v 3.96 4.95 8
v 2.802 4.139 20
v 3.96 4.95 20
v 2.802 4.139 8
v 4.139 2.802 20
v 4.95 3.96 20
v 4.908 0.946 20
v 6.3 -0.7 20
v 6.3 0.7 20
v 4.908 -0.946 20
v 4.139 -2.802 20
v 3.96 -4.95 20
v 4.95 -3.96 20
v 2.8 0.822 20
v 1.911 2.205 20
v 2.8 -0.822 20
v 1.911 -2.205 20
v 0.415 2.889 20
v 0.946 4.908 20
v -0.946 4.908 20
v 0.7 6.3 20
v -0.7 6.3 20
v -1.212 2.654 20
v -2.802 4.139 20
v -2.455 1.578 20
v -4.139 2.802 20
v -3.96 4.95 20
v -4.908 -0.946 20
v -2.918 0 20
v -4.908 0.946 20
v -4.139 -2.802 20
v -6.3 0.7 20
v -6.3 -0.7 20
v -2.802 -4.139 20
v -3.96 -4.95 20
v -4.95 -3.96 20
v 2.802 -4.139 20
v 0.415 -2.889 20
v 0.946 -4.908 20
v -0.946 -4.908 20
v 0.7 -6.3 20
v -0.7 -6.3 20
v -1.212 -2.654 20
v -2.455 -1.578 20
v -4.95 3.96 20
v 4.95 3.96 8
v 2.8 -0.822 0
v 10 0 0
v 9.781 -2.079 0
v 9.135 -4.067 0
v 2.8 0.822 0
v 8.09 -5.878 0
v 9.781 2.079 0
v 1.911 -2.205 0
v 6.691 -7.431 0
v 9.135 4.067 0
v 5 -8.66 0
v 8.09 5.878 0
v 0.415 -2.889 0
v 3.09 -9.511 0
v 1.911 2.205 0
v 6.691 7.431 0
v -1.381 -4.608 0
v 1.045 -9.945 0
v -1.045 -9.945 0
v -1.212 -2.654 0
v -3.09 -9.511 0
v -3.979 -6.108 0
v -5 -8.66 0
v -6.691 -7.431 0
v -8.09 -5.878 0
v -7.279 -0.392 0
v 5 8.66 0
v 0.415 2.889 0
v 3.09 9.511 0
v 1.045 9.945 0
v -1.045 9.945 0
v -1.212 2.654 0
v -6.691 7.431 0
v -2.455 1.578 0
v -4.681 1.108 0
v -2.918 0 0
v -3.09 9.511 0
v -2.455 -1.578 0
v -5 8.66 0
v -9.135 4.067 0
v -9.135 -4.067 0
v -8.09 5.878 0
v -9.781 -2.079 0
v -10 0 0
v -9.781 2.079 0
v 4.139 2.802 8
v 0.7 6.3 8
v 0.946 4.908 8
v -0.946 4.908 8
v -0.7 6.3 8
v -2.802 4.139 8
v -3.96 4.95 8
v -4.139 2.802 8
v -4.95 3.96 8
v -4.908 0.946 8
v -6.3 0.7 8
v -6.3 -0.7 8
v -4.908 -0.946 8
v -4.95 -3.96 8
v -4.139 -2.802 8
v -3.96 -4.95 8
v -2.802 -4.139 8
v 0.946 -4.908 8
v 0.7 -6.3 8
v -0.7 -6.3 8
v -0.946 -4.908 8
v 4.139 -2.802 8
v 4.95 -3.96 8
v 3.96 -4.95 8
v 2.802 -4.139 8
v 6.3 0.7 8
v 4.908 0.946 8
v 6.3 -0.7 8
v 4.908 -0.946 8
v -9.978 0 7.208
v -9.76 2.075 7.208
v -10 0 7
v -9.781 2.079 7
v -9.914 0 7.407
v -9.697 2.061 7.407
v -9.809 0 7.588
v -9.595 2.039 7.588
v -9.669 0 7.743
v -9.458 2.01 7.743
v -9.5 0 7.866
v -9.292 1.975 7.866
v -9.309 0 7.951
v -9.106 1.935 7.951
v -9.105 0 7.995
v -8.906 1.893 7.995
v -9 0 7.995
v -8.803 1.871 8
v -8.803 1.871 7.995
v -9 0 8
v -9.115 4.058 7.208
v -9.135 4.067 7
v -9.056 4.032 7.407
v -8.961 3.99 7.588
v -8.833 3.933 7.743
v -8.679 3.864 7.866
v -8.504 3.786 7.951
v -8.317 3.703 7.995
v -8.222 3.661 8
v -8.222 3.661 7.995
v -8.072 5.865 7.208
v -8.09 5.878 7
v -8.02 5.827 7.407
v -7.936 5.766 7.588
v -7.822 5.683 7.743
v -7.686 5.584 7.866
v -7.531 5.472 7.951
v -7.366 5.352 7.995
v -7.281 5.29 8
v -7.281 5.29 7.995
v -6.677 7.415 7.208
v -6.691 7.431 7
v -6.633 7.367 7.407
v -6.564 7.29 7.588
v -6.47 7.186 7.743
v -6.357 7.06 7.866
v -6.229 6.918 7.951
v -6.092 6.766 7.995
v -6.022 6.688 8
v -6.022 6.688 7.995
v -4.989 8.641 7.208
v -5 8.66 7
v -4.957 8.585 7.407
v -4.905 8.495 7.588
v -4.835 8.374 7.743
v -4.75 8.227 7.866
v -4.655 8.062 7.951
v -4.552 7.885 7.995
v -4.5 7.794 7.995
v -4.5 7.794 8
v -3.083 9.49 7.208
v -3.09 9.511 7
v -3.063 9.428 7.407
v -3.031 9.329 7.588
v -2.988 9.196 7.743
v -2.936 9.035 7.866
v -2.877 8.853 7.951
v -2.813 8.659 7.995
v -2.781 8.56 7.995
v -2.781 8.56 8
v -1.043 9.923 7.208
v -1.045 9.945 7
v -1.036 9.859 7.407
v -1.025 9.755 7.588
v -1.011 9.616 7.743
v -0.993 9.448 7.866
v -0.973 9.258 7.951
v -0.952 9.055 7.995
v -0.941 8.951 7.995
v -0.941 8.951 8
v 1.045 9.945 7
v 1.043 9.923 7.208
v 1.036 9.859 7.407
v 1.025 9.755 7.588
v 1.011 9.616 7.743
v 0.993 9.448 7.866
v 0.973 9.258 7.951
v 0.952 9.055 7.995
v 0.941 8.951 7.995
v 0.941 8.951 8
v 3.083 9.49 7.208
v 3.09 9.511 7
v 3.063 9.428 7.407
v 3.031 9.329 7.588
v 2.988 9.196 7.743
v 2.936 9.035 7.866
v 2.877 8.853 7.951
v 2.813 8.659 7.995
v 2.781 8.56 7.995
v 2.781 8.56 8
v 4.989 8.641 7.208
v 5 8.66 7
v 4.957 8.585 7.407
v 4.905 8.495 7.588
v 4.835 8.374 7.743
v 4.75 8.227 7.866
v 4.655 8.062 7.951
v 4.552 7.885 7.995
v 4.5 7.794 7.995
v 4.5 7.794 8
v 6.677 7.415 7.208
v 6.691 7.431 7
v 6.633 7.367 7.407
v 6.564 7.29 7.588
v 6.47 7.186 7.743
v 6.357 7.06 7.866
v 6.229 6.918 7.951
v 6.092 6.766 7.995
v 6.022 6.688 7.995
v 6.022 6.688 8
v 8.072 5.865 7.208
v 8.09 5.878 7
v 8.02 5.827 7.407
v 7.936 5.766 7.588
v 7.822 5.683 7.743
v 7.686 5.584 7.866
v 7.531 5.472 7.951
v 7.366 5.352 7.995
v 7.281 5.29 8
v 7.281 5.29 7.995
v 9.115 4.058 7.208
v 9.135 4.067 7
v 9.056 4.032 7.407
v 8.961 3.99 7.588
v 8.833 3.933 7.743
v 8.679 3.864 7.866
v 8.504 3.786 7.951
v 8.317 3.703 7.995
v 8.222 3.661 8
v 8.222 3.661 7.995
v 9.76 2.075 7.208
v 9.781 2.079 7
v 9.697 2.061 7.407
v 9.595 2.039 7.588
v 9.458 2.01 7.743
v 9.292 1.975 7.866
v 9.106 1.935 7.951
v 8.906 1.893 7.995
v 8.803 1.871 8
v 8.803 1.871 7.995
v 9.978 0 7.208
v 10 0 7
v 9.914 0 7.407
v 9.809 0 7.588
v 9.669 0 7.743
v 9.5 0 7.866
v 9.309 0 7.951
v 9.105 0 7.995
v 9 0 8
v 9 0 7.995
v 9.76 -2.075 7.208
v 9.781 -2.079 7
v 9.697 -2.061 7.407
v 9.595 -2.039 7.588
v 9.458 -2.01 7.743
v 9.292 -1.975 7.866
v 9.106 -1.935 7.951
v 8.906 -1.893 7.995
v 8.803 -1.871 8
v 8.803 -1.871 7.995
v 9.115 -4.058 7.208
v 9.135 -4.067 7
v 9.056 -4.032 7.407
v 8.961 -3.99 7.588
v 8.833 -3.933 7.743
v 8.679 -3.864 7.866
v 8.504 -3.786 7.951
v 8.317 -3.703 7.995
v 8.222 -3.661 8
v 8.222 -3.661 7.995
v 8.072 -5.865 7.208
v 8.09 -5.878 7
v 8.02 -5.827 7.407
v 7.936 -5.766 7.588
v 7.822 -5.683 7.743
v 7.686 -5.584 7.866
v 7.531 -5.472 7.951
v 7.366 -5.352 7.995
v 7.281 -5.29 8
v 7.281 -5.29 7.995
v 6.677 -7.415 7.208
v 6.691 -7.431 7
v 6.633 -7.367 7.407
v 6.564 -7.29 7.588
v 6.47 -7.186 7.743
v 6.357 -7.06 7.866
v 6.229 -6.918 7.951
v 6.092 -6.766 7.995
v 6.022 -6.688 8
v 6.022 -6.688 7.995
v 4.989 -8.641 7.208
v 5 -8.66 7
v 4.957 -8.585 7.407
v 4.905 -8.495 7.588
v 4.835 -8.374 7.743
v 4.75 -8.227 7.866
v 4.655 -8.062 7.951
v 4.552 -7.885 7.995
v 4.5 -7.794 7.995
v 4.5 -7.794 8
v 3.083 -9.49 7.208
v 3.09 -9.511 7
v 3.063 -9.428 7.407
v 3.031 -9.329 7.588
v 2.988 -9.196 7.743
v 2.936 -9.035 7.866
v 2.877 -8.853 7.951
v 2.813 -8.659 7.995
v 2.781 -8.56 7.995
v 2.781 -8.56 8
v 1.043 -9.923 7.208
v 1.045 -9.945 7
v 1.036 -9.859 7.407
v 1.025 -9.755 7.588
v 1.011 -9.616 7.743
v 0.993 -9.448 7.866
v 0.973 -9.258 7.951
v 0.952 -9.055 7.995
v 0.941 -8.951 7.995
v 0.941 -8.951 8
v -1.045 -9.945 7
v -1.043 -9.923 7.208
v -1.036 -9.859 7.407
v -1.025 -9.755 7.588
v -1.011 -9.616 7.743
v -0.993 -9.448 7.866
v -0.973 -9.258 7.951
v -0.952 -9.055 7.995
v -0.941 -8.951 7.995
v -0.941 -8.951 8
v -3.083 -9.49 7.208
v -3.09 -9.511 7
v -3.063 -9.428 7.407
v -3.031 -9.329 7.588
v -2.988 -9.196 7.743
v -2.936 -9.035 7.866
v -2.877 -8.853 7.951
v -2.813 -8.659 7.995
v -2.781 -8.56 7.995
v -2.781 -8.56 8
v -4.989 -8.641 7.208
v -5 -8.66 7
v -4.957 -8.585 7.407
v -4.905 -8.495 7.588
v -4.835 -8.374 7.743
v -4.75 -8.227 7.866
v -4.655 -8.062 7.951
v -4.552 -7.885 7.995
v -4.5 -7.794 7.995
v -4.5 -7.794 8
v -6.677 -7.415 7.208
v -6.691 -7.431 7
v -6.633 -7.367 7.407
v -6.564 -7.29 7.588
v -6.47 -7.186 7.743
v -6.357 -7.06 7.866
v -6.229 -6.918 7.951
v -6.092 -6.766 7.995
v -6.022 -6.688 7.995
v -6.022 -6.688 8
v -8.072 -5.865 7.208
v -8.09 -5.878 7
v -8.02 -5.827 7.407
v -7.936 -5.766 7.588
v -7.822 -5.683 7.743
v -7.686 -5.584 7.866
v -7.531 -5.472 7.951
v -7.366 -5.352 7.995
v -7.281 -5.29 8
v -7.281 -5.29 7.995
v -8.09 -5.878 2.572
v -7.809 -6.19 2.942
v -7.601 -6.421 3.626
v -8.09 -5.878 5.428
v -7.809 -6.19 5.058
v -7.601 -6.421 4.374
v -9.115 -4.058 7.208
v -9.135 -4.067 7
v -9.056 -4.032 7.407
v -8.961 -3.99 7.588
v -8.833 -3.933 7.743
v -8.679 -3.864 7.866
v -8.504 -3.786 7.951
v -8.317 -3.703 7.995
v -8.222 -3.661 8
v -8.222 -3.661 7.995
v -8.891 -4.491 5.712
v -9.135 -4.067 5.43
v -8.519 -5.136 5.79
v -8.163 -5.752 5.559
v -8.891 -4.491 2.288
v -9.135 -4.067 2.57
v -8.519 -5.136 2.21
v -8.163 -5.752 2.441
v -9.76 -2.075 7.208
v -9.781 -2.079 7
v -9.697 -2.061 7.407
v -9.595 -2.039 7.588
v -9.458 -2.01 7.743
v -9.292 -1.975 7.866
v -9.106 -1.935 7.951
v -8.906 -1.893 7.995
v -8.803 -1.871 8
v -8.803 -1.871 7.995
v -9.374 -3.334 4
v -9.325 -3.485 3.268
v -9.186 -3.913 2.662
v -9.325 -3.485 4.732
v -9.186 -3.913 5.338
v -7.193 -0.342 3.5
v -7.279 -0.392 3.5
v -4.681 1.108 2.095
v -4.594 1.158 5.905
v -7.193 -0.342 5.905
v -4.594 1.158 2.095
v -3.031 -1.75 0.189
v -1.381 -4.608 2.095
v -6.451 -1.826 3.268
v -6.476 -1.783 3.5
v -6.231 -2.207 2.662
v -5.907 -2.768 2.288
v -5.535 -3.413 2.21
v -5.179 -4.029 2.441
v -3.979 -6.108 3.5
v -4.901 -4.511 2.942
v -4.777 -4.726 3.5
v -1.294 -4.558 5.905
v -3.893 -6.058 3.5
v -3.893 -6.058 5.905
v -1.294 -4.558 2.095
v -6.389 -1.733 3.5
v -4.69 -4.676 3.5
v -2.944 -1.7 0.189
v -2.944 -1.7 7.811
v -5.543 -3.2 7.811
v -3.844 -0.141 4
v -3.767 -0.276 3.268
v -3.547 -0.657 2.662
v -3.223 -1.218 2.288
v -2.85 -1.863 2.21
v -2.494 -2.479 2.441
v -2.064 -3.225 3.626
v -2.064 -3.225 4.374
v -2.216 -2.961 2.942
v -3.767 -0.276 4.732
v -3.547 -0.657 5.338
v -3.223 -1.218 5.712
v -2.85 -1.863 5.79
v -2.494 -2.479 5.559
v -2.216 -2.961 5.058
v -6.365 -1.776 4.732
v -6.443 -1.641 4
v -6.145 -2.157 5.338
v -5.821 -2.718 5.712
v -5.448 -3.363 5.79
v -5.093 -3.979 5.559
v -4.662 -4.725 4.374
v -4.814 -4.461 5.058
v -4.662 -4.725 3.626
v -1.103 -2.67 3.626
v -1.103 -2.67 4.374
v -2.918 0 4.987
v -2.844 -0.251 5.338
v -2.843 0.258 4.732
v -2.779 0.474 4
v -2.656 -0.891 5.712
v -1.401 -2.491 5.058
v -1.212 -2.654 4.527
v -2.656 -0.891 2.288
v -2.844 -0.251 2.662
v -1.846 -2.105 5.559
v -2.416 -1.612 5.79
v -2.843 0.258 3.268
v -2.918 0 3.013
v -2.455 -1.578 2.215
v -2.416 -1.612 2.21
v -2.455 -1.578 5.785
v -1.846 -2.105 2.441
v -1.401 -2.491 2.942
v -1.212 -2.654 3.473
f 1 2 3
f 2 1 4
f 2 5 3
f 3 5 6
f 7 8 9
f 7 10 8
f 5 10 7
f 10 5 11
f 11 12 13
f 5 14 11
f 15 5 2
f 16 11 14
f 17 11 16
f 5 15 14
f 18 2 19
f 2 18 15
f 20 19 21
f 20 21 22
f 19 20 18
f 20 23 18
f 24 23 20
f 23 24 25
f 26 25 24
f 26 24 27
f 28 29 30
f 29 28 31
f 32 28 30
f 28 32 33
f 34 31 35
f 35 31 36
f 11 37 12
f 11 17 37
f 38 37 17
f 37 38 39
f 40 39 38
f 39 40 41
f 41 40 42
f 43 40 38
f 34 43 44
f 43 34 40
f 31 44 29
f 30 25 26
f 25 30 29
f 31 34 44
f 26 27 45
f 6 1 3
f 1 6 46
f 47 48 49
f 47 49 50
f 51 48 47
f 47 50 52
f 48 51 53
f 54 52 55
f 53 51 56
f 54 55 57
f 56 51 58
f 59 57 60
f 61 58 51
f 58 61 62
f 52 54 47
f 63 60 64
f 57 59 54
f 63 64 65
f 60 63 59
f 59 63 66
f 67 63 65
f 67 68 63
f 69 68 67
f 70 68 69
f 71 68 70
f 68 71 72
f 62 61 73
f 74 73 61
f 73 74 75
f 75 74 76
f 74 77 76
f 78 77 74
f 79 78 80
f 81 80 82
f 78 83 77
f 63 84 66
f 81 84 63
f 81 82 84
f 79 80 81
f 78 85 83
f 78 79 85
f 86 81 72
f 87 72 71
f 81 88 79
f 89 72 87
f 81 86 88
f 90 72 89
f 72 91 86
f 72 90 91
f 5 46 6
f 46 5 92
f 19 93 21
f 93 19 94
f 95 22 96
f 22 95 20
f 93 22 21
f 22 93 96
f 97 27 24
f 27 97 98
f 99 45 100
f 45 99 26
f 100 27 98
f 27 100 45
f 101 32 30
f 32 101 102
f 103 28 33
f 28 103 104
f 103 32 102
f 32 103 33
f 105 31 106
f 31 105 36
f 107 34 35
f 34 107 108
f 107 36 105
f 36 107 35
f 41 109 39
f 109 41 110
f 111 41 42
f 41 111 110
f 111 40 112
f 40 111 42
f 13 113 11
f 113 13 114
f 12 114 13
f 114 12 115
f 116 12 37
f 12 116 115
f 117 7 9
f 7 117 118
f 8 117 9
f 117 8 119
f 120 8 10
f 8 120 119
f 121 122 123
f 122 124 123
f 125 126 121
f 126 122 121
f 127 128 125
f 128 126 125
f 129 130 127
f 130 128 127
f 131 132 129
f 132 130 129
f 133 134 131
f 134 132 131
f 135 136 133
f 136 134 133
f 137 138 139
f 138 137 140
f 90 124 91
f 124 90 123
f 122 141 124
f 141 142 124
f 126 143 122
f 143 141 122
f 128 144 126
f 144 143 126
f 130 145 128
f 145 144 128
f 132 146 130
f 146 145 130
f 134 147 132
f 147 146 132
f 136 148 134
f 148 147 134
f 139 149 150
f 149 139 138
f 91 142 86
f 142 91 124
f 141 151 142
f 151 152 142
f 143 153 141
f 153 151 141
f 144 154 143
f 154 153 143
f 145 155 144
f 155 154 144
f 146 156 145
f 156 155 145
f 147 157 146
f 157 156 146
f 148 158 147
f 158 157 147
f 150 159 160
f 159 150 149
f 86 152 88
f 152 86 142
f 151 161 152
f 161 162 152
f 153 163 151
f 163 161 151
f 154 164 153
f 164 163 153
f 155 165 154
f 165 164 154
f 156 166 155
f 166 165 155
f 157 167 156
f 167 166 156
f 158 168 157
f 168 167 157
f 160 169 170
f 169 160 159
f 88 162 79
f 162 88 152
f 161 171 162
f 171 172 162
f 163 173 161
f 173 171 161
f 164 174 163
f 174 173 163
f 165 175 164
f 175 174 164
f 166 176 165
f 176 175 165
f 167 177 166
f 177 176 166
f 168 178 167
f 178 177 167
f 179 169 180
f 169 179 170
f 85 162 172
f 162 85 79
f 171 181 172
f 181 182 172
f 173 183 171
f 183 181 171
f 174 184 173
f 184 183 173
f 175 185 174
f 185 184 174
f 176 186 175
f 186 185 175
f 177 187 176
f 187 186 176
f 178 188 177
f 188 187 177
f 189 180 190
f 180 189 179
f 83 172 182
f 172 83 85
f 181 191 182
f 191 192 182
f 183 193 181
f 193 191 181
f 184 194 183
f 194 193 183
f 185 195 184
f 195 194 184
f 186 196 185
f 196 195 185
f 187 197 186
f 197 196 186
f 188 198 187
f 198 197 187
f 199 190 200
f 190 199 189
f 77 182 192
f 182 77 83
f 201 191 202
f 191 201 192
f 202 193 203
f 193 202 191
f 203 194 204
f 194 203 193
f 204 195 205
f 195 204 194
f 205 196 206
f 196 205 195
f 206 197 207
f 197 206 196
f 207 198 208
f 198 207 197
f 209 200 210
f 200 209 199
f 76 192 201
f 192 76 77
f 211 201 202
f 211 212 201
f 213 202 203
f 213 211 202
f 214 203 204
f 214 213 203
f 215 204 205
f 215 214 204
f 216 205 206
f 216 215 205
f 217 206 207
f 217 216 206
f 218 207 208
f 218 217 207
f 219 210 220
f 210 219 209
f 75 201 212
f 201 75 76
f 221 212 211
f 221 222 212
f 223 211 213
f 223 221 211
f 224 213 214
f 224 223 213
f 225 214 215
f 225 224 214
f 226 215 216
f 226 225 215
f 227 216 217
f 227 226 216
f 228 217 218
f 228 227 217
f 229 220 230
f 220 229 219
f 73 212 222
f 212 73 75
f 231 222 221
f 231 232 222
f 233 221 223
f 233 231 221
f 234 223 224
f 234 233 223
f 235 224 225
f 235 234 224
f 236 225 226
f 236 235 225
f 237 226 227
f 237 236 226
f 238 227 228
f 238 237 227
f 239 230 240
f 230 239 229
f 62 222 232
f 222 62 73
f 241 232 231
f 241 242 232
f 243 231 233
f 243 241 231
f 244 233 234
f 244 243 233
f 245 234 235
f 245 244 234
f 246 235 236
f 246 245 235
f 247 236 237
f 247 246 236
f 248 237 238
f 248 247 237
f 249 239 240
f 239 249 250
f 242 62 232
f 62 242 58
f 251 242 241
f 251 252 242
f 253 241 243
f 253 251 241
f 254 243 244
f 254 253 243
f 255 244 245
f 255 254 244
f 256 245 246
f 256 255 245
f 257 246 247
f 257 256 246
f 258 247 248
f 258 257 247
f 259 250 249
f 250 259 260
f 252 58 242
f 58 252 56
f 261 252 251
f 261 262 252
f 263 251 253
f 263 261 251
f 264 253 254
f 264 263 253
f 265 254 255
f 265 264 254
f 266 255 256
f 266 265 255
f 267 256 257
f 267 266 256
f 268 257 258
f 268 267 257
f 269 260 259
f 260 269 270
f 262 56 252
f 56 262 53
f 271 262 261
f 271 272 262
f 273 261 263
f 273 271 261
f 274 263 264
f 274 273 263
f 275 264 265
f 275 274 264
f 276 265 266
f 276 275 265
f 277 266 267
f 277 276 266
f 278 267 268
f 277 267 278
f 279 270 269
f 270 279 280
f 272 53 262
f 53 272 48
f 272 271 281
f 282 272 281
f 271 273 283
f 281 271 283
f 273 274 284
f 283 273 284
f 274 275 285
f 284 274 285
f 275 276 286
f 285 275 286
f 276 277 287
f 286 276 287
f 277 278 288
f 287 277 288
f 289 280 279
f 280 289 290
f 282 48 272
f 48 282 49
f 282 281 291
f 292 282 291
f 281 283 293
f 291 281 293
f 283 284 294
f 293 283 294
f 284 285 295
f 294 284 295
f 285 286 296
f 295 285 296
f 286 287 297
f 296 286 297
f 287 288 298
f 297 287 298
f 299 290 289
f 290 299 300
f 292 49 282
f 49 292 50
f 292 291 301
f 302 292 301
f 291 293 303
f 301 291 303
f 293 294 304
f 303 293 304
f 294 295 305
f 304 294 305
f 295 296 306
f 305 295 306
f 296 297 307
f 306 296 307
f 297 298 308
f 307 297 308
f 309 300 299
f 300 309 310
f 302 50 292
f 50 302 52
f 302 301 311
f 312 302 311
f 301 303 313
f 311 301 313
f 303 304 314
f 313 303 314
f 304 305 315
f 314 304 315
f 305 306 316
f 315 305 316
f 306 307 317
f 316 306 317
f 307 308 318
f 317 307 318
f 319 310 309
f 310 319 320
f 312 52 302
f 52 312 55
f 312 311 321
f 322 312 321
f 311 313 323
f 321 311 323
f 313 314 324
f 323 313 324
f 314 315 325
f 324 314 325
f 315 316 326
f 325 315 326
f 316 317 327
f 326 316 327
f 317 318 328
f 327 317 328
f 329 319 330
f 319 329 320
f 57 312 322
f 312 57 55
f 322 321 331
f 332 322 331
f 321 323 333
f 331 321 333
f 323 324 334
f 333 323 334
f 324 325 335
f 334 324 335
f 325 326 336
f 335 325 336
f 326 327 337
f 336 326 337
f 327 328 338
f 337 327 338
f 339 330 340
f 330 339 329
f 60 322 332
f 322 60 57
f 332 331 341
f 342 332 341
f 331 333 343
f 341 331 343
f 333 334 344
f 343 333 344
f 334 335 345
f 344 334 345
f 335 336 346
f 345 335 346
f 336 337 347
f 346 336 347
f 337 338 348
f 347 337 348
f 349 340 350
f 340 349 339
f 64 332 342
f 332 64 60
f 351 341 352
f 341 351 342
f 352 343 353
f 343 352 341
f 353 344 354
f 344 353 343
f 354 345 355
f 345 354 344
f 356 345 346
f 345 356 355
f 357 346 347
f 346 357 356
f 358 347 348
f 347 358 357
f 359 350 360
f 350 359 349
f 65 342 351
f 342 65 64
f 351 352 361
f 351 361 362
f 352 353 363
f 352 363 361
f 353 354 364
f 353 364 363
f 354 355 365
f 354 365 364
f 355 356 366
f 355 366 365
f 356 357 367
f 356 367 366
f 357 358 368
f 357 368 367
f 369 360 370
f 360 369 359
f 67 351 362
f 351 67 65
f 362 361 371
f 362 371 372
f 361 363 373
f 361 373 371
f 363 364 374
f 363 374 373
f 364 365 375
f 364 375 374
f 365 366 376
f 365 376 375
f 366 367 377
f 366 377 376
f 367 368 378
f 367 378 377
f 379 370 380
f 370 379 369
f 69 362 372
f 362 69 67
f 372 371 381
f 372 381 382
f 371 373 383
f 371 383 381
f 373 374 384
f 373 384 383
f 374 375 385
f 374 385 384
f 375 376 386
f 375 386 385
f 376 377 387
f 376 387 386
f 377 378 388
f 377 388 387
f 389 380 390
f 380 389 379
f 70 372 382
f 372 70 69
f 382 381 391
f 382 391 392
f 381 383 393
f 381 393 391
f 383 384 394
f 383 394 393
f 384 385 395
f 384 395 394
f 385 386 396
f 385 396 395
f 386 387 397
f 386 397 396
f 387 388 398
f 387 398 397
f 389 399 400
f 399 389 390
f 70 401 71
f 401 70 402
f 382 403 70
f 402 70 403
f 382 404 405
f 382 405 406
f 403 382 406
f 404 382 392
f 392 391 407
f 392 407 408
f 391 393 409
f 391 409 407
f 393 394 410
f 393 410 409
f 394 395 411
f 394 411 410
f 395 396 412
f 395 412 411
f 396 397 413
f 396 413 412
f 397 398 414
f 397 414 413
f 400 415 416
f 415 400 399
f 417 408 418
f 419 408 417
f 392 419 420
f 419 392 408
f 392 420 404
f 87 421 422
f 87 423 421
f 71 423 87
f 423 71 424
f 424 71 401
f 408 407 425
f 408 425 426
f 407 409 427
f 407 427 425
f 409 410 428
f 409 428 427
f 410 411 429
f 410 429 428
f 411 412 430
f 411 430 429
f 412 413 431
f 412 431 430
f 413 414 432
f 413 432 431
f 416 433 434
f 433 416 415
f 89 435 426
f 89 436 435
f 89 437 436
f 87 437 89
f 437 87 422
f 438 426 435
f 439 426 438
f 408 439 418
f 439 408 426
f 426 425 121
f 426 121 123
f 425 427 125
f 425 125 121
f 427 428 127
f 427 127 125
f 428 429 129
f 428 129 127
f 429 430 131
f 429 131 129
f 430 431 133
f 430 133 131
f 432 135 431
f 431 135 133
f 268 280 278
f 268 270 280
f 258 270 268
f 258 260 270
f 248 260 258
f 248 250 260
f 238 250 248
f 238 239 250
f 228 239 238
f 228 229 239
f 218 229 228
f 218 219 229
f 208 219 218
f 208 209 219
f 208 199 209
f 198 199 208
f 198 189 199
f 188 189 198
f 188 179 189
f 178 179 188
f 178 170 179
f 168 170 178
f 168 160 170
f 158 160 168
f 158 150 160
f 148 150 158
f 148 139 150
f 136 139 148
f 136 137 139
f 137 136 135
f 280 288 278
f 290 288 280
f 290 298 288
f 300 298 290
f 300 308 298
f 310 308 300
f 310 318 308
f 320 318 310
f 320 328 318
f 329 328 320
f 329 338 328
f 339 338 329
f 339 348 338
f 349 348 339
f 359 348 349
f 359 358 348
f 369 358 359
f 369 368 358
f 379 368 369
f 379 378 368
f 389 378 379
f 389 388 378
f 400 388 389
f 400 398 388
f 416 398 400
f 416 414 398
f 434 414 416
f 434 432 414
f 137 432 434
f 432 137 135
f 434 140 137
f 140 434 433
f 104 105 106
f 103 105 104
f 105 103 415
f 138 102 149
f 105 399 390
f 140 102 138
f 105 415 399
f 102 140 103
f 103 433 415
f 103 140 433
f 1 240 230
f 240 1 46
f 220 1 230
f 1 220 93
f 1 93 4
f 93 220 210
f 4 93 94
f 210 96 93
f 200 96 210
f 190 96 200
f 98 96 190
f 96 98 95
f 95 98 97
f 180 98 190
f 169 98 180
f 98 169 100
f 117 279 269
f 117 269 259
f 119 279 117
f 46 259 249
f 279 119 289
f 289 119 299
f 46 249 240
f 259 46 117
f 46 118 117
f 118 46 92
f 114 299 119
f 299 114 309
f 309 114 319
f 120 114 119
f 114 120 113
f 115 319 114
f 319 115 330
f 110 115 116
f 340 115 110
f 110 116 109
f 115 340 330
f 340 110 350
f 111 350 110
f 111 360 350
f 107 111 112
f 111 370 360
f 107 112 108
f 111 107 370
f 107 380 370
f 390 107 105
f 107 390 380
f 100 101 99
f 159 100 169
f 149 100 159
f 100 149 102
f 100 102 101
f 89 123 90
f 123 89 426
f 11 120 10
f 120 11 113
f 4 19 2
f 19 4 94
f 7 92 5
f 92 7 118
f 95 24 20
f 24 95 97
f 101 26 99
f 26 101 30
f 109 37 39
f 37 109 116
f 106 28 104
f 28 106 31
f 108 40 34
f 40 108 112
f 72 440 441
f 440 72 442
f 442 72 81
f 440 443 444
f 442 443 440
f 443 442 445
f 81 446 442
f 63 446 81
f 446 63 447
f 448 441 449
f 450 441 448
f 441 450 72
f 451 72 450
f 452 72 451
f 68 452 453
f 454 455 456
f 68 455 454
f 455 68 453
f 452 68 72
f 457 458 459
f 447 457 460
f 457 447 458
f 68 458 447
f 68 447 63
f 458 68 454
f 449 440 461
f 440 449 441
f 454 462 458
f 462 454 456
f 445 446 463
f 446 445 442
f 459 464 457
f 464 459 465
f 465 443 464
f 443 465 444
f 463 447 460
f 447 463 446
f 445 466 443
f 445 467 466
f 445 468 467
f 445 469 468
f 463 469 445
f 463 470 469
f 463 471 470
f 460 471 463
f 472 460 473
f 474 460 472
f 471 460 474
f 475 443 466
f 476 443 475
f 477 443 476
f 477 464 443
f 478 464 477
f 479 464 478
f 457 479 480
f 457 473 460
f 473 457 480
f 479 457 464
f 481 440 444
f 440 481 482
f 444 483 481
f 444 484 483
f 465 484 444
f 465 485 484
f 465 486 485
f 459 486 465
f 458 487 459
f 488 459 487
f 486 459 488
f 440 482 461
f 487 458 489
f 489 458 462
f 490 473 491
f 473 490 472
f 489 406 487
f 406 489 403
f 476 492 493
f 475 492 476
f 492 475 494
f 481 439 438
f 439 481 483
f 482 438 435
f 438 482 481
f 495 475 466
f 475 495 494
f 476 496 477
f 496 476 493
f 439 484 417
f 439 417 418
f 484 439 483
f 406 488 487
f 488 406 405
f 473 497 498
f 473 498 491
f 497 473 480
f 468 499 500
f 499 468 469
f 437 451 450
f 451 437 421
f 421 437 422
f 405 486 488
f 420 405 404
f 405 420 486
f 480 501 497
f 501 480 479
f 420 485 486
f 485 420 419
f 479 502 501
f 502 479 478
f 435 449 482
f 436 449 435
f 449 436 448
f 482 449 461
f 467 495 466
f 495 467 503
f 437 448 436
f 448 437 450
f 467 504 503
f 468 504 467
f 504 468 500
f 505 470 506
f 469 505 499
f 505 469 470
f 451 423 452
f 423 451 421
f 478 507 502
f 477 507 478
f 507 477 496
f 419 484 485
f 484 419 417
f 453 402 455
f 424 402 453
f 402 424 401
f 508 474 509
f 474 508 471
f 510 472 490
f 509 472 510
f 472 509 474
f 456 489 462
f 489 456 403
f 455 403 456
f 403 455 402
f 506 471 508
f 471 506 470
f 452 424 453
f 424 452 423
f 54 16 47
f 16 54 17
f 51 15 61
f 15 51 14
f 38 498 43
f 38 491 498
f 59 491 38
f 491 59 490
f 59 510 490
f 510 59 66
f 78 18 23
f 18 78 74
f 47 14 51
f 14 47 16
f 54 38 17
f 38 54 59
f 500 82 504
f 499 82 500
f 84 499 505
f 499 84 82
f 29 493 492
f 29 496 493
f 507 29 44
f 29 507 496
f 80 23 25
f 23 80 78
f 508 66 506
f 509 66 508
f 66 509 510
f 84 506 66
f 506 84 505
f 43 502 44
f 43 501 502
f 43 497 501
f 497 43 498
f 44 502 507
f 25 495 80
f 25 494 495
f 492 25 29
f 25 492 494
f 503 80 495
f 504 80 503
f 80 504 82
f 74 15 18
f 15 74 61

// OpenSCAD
// file: functions.scad
// PRUSA Mendel  
// Functions used in many files
// GNU GPL v2
// Josef Průša
// josefprusa@me.com
// prusadjs.cz
// http://www.reprap.org/wiki/Prusa_Mendel
// http://github.com/prusajr/PrusaMendel

module nut(d,h,horizontal=true){
cornerdiameter =  (d / 2) / cos (180 / 6);
cylinder(h = h, r = cornerdiameter, $fn = 6);
if(horizontal){
for(i = [1:6]){
	rotate([0,0,60*i]) translate([-cornerdiameter-0.2,0,0]) rotate([0,0,-45]) cube(size = [2,2,h]);
}}
}

// By nophead
module polyhole(d,h) {
    n = max(round(2 * d),3);
    rotate([0,0,180])
        cylinder(h = h, r = (d / 2) / cos (180 / n), $fn = n);
}




module roundcorner(diameter){
	difference(){
		cube(size = [diameter,diameter,99], center = false);
		translate(v = [diameter, diameter, 0]) cylinder(h = 100, r=diameter, center=true);
	}
}
// file: metric.scad
// PRUSA Mendel  
// Default metric sizes
// GNU GPL v2
// Josef Průša
// josefprusa@me.com
// prusadjs.cz
// http://www.reprap.org/wiki/Prusa_Mendel
// http://github.com/prusajr/PrusaMendel

// DONT CHANGE THIS FILE! ALTER VALUES IN CONFIGURATION.SCAD INSTEAD

// RODS

threaded_rod_diameter = 8.2;
threaded_rod_diameter_horizontal = 8.2;
smooth_bar_diameter = 8;
smooth_bar_diameter_horizontal = 8.5;

// Nuts and bolts

m8_diameter = 9;
m8_nut_diameter = 16.4;

m4_diameter = 4.5;
m4_nut_diameter = 9;

m3_diameter = 3.6;
m3_nut_diameter = 6.1;

// Bushing holder

bushing_core_diameter = smooth_bar_diameter;
bushing_material_thickness = 1;

// Motors

motor_shaft = 5.5;
// file: configuration.scad
// PRUSA Mendel  
// Configuration file
// GNU GPL v2
// Josef Průša
// josefprusa@me.com
// prusadjs.cz
// http://www.reprap.org/wiki/Prusa_Mendel
// http://github.com/prusajr/PrusaMendel

// PLEASE SELECT ONE OF THE CONFIGURATIONS BELOW
// BY UN-COMMENTING IT

// Uncomment for metric settings
// METRIC METRIC METRIC METRIC METRIC METRIC METRIC METRIC 

include <metric.scad>;

// Uncomment for imperial settings
// IMPERIAL IMPERIAL IMPERIAL IMPERIAL IMPERIAL IMPERIAL IMPERIAL 

//include <sae.scad>;


// CUSTOM CUSTOM CUSTOM CUSTOM CUSTOM CUSTOM CUSTOM CUSTOM CUSTOM

thin_wall = 3;

// LM8UU
linear =0;


// CHANGE ONLY THE STUFF YOU KNOW
// IT WILL REPLACE DEFAULT SETTING

// RODS

// threaded_rod_diameter = 0;
// threaded_rod_diameter_horizontal = 0;
// smooth_bar_díameter = 0;
// smooth_bar_díameter_horizontal = 0;

// Nuts and bolts

// m8_diameter = 0;
// m8_nut_diameter = 0;

// m4_diameter = 0;
// m4_nut_diameter = 0;

// m3_diameter = 0;
// m3_nut_diameter = 0;

// Bushing holder

// bushing_core_diameter = smooth_bar_díameter;
// bushing_material_thickness = 0;


///counted stuff
m3_nut_diameter_bigger = ((m3_nut_diameter  / 2) / cos (180 / 6))*2;

// functions 
include <functions.scad>
// main file
// Belt pulley is http://www.thingiverse.com/thing:3104 by GilesBathgate
// GPLV3

include <configuration.scad>


/**
 * @id pulley
 * @name Pulley
 * @category Printed
 * @using 1 m3nut
 * @using 1 m3x10xhex
 */
module pulley()
{


	module spur()
	{
		linear_extrude(height=20) polygon([[-1,-1],[-1,1],[0.7,0.7],[0.7,-0.7]],[[0,1,2,3,0]]);
	}
	
 difference()
 {	 
 	union()
 	{
 		//base
 		rotate_extrude($fn=30)
 		{
 				square([9,8]);
 				square([10,7]);
 				translate([9,7]) circle(1);
 		}
    	
    	//shaft
    	cylinder(r=motor_shaft-0.2,h=20, $fn=8);
    	
    	//spurs
    	for(i=[1:8]) rotate([0,0,i*(360/8)])
    	translate([5.6,0,0])spur();
   }
   
   //shaft hole
    translate([0,0,-1])polyhole(motor_shaft+0.1,22);
    		
 //captive nut and grub holes
    for(j=[1:1]) rotate([0,0,j*(360/3)])
	translate([0,20,4])rotate([90,0,0])
	union()
	{
		//entrance
		translate([0,-3,15]) cube([m3_nut_diameter+0.5,5,3],center=true);
		//nut
		translate([0,0,13.6]) rotate([0,0,30]) nut(m3_nut_diameter+0.5, 3, false);
		//grub hole
		translate([0,0,9]) cylinder(r=m3_diameter/2,h=10, $fn=15);
	}

 }

   
}

pulley();
